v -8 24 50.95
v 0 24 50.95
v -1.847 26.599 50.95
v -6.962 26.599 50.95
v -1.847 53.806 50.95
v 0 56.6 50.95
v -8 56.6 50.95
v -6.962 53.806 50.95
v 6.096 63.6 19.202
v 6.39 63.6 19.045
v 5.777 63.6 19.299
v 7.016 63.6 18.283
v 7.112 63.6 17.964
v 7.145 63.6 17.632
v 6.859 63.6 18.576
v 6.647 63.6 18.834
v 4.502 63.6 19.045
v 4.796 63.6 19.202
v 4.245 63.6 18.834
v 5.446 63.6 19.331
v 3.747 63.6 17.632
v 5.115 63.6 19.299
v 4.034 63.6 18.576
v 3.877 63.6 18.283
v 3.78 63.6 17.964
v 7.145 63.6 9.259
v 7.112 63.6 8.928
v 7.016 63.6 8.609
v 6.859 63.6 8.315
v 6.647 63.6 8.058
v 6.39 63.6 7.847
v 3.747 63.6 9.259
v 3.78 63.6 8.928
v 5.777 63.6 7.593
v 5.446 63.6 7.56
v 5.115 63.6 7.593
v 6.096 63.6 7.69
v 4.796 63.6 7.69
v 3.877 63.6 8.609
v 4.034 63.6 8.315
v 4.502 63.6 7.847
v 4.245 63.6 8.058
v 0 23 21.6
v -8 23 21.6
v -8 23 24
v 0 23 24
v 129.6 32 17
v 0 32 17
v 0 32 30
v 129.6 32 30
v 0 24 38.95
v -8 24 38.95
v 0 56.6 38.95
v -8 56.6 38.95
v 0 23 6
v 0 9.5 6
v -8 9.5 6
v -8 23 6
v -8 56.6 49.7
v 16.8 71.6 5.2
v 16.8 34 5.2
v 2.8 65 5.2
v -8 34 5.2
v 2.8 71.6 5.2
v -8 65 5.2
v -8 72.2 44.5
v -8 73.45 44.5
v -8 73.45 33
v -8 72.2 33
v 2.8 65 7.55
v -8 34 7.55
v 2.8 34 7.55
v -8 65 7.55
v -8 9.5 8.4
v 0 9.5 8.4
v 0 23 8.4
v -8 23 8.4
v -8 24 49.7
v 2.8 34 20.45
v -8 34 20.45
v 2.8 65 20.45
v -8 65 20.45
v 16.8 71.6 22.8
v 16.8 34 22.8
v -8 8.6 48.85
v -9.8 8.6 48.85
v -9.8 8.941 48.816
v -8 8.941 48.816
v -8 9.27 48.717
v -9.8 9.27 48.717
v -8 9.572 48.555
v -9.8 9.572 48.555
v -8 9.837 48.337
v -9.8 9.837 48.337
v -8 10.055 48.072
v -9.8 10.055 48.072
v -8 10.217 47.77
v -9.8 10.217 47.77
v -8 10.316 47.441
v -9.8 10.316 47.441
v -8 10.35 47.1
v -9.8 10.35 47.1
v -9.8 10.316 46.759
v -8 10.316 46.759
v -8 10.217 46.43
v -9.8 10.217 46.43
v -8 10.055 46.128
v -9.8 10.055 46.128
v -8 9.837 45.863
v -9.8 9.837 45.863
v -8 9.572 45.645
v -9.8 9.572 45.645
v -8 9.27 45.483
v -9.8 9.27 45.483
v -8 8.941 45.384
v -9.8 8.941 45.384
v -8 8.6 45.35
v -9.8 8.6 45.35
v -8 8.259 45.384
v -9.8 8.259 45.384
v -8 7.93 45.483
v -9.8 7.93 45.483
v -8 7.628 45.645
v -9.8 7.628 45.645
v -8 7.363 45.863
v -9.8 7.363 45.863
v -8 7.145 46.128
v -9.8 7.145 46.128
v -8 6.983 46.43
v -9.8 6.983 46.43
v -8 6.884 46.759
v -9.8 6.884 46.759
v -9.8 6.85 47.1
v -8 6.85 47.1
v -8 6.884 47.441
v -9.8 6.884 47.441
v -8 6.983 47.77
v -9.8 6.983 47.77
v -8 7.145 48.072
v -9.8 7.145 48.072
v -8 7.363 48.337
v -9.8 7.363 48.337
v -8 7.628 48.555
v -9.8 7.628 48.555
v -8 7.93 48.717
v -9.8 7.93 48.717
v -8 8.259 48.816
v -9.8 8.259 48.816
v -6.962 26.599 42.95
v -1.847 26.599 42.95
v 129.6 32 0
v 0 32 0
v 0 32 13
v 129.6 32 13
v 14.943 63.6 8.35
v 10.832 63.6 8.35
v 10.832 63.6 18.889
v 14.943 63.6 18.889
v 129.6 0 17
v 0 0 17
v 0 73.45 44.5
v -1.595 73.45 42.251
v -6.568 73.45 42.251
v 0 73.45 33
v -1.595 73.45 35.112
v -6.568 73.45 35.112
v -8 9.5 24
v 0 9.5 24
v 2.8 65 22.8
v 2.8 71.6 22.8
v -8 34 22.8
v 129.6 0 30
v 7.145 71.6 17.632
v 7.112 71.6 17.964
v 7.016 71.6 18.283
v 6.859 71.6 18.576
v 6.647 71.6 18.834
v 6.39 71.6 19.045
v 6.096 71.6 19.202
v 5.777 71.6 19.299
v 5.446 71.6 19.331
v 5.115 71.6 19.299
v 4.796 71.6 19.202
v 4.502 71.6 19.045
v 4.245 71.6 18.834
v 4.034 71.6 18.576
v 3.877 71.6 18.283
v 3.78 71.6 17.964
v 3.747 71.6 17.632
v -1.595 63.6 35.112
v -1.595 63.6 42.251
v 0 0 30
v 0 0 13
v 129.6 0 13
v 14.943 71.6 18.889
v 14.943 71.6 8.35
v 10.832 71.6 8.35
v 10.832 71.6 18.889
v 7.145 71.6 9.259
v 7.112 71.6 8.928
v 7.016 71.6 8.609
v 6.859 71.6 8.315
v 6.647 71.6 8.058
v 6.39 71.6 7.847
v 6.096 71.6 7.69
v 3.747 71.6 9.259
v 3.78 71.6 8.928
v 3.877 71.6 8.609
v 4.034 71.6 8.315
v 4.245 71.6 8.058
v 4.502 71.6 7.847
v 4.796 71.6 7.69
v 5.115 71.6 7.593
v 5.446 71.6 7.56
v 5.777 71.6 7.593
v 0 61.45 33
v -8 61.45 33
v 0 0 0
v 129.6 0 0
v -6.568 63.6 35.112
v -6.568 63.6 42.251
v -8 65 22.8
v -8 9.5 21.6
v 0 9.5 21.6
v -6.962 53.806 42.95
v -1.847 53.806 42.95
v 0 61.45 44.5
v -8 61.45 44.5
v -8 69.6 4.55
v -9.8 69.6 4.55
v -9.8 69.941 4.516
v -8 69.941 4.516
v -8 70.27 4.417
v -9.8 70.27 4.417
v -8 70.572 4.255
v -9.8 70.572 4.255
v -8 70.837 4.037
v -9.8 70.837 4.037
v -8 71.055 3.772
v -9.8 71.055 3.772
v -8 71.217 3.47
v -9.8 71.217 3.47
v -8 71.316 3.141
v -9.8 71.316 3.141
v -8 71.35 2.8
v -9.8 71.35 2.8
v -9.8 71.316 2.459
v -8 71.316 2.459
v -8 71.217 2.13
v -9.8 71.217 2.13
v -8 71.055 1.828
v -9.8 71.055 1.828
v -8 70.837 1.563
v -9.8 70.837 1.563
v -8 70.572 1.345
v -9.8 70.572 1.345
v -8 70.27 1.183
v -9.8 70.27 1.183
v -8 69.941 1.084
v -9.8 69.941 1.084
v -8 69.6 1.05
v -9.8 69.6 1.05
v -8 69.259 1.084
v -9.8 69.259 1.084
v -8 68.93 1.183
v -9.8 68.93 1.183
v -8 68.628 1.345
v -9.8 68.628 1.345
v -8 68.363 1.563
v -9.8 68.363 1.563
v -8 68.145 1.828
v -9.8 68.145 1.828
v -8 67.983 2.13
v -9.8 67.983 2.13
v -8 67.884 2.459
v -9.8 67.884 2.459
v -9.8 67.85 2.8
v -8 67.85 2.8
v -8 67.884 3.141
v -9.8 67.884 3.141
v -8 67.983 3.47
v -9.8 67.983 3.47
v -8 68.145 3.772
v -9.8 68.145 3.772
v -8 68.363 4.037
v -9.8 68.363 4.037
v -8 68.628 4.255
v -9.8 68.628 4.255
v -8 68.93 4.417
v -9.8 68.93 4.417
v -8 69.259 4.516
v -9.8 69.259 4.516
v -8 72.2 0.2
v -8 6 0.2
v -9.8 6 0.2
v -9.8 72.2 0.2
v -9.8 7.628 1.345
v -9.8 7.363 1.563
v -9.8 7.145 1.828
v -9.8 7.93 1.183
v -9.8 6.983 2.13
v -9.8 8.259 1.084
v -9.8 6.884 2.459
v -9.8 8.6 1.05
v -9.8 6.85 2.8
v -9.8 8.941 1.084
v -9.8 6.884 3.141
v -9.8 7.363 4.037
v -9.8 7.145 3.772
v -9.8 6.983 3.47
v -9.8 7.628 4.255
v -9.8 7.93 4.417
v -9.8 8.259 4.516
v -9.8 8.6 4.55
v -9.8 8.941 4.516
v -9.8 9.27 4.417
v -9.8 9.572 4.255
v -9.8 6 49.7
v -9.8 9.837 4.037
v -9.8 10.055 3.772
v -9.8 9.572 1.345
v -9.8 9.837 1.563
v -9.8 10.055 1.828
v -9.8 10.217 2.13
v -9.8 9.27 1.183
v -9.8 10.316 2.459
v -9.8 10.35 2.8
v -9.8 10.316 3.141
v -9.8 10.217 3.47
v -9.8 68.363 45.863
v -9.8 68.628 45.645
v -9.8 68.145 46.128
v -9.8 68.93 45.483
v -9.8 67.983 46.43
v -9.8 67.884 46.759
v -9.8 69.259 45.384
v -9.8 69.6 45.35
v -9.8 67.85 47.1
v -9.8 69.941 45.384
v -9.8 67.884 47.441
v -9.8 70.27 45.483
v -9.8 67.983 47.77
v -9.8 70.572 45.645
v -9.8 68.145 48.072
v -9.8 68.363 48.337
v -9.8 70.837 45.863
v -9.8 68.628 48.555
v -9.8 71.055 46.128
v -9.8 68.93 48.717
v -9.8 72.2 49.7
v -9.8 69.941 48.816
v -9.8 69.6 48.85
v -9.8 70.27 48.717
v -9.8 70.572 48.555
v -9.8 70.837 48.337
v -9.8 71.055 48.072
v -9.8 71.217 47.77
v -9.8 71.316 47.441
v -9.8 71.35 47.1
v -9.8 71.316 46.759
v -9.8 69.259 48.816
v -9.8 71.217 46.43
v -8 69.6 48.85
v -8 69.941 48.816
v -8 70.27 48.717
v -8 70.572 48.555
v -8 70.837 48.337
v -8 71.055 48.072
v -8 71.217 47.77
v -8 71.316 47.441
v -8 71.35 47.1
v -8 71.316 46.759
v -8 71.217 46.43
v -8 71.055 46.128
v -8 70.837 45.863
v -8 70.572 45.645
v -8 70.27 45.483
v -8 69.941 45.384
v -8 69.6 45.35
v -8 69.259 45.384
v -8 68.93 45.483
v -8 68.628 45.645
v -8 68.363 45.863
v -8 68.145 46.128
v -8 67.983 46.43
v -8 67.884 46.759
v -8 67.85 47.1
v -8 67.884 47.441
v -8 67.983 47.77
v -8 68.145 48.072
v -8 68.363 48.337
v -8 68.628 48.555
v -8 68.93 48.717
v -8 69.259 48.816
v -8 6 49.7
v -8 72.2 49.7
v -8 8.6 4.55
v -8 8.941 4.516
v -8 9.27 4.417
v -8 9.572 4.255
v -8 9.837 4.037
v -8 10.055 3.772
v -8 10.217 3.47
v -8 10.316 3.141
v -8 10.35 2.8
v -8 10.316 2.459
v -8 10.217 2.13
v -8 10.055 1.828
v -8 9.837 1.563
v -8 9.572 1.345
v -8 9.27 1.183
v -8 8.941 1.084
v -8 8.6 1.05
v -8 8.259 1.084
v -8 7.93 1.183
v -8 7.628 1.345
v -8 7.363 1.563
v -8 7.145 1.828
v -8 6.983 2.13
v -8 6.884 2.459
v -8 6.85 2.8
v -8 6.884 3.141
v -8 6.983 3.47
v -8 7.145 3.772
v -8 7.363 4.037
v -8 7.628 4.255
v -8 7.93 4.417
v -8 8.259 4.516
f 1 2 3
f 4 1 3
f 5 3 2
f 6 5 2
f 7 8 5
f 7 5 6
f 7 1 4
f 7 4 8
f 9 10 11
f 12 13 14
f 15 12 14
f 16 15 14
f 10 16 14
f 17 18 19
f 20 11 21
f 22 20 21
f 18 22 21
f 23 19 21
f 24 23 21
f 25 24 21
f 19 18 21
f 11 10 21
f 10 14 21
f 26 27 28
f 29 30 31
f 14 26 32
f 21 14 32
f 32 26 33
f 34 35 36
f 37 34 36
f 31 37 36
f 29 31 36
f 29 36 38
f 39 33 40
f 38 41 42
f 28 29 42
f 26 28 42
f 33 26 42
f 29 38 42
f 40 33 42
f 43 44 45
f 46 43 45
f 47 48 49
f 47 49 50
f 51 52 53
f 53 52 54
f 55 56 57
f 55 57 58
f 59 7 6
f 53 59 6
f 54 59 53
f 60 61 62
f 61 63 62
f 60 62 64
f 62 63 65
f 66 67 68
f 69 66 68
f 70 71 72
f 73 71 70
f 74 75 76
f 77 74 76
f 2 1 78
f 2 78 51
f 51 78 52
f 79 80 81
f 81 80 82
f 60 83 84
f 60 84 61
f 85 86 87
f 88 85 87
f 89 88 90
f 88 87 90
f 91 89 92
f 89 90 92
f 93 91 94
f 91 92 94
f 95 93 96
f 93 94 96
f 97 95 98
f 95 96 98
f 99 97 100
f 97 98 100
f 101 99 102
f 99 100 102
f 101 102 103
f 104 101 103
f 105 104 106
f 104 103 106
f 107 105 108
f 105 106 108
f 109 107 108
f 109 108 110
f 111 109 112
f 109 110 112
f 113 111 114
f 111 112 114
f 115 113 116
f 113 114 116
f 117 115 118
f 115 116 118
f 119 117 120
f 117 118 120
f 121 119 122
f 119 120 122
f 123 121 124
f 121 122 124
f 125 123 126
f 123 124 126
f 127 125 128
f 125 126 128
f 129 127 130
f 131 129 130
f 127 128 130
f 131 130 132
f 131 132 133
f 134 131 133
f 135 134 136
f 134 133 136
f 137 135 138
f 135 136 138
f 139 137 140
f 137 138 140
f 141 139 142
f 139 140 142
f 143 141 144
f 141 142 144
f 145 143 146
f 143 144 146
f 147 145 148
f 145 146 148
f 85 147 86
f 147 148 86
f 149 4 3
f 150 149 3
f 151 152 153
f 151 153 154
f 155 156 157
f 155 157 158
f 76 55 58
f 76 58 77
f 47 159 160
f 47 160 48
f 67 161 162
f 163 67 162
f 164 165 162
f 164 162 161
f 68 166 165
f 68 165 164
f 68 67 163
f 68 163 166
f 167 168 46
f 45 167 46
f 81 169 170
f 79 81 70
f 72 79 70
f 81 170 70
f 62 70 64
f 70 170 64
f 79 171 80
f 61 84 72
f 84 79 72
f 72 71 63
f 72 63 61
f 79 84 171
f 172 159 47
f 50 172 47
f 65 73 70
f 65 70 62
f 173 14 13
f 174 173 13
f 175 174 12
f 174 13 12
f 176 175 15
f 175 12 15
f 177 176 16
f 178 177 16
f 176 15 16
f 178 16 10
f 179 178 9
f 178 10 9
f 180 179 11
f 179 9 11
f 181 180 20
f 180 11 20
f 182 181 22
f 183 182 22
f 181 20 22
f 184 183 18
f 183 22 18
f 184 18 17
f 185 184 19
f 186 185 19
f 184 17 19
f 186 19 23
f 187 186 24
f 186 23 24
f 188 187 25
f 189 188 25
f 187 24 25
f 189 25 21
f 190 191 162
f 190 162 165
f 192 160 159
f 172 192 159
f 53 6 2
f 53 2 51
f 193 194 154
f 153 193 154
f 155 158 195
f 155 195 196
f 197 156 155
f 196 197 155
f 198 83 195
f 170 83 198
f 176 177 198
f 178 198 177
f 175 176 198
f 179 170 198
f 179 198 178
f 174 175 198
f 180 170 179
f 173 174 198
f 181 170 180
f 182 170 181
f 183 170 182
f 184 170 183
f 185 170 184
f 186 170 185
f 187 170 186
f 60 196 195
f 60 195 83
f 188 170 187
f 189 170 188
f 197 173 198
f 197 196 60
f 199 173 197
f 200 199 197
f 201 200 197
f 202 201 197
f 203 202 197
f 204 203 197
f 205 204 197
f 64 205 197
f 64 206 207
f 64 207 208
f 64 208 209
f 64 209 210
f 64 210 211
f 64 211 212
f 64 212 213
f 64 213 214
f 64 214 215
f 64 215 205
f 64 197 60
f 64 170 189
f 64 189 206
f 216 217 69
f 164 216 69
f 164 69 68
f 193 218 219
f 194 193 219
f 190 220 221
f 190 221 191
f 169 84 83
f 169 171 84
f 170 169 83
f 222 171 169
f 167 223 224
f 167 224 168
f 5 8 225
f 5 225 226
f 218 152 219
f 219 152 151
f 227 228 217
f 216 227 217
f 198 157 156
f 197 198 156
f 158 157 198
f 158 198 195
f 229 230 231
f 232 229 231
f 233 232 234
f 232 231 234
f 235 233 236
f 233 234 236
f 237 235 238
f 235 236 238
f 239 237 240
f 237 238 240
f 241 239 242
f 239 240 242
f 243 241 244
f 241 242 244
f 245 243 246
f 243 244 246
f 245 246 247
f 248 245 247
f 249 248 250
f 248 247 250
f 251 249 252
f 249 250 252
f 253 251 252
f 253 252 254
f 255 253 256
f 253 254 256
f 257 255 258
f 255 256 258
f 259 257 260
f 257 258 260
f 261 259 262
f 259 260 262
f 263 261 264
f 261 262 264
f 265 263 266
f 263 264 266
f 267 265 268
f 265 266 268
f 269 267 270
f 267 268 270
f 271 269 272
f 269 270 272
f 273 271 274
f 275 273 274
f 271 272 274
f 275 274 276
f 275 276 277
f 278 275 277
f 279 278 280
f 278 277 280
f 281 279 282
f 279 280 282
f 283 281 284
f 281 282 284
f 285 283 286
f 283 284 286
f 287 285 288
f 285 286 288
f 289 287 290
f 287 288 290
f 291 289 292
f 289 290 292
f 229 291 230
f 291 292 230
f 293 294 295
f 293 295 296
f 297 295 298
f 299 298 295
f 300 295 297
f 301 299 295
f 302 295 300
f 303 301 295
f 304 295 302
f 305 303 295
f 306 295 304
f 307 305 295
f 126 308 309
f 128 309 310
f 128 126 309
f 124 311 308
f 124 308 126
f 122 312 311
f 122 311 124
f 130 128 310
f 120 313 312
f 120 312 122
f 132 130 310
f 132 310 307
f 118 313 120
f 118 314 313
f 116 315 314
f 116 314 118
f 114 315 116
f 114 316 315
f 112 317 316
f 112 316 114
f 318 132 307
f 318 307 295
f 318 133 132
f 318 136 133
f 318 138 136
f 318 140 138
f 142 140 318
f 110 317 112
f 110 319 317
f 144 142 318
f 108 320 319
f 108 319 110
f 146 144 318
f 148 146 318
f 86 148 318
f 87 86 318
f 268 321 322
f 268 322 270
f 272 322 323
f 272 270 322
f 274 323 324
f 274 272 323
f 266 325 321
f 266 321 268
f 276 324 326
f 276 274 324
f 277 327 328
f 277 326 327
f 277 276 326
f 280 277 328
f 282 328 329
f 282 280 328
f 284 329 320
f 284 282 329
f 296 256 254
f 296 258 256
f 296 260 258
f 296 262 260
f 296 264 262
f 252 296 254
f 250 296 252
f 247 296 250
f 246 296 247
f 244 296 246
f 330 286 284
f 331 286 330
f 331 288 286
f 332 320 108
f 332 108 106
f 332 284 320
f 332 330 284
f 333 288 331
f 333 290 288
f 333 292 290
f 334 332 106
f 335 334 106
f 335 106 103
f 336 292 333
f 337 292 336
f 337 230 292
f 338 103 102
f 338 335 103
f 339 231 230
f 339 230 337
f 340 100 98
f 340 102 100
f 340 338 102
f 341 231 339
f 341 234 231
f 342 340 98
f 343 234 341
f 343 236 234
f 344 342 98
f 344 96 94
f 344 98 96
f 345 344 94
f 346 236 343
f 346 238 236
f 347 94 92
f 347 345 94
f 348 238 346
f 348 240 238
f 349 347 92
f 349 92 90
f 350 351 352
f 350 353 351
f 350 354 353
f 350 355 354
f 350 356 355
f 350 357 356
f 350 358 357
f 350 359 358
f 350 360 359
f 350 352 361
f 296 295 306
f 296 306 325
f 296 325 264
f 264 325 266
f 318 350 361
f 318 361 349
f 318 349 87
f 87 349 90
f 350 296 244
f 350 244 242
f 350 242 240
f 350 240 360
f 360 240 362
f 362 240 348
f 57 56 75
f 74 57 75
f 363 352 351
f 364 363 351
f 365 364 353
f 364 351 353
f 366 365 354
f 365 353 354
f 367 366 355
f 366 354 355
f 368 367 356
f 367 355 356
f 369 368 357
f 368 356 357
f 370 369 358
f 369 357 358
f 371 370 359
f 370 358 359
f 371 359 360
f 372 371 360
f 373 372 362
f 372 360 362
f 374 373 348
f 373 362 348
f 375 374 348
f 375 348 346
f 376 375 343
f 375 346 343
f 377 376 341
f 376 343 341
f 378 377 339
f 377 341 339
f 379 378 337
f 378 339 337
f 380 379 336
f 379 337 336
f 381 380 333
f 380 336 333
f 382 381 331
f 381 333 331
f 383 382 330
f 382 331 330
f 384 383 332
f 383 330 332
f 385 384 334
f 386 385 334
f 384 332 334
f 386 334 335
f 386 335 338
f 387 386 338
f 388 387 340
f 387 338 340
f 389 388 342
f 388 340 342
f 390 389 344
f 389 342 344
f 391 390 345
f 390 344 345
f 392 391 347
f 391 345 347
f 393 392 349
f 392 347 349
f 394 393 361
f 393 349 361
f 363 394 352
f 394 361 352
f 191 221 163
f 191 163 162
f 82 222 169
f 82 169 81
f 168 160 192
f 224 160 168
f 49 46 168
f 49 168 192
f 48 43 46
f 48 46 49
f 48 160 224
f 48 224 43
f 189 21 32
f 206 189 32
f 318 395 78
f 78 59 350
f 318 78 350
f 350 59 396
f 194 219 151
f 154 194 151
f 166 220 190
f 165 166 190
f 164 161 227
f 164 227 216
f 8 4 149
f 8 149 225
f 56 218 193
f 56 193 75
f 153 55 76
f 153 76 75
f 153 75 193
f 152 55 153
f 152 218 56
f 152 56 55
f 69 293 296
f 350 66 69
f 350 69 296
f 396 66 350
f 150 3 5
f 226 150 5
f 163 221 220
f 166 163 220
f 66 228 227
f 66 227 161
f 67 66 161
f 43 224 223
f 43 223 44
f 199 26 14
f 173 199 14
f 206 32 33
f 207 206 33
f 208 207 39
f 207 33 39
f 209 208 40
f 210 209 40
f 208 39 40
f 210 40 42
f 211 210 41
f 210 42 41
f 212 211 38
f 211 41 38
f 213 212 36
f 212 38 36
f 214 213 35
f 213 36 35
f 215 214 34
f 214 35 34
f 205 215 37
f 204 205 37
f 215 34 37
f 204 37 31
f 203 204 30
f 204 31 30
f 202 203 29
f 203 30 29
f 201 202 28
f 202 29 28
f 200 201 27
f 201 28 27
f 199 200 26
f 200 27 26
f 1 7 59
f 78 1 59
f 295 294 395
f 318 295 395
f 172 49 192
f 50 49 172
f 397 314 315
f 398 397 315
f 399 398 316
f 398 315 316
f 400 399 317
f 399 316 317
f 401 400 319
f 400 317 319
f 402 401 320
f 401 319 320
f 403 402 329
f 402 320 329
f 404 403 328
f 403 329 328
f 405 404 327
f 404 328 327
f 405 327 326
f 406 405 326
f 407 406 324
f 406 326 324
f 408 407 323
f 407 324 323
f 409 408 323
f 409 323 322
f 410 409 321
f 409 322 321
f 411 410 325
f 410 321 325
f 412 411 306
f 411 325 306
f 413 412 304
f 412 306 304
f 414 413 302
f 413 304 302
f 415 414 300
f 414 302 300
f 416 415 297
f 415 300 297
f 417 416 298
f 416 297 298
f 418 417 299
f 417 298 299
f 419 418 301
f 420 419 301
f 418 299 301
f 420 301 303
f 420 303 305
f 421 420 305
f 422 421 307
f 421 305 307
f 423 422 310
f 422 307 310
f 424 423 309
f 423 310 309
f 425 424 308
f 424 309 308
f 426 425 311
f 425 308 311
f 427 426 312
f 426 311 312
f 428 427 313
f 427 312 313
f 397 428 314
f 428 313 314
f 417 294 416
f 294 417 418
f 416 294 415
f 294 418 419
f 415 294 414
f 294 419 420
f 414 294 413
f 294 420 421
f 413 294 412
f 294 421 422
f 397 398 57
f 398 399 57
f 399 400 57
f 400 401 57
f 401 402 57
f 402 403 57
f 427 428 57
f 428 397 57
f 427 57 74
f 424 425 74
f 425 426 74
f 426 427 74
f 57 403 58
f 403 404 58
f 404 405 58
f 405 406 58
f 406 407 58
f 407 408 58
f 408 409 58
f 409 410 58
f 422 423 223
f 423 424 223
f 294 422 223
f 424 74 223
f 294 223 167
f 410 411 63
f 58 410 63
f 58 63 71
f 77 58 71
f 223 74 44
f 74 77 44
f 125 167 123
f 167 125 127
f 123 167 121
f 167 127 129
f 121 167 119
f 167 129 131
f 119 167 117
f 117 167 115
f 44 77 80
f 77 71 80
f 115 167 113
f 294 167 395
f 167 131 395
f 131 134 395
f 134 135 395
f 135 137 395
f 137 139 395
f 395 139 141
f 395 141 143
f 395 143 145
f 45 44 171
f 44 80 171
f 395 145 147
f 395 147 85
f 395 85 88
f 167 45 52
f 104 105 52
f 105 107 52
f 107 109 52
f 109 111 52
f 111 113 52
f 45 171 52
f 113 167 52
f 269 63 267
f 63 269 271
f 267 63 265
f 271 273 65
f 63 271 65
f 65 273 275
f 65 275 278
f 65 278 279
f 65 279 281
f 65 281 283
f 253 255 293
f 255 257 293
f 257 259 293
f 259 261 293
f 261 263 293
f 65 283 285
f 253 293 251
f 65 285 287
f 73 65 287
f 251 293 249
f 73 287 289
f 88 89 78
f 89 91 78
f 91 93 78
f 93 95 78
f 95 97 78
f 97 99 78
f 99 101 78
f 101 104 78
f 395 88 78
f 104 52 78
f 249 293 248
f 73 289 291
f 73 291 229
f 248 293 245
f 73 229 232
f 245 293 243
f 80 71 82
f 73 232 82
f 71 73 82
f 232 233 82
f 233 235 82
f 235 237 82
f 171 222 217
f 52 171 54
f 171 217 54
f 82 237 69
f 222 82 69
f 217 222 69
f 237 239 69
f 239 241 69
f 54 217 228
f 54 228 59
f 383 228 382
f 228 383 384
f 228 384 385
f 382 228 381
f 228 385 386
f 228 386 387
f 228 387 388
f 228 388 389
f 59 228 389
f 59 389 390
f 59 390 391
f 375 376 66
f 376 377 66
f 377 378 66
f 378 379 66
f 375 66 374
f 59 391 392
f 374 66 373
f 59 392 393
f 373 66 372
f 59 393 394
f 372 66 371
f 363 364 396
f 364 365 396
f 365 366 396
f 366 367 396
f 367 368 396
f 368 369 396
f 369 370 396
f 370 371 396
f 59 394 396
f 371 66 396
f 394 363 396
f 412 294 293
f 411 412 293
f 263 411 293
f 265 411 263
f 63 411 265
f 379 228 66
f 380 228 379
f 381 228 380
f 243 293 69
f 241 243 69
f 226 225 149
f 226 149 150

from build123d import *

# Parameters (mm, degrees)
SKETCH2_W               = 129.6
SKETCH2_H               = 32
BOSS_EXTRUDE1_DEPTH     = 30
SKETCH3_W               = 2.4
SKETCH3_H               = 13.5
BOSS_EXTRUDE2_DEPTH     = 8
SKETCH4_W               = 49.5
SKETCH4_H               = 66.2
BOSS_EXTRUDE3_DEPTH     = 1.8
SKETCH5_R               = 1.75
CUT_EXTRUDE1_DEPTH      = 1.8
SKETCH6_W               = 2.35
SKETCH6_H               = 31
BOSS_EXTRUDE4_DEPTH     = 10.8
SKETCH7_W               = 17.6
SKETCH7_H               = 37.6
BOSS_EXTRUDE5_DEPTH     = 14
SKETCH8_W               = 11.5
SKETCH8_H               = 12
SKETCH8_W_2             = 12
SKETCH8_H_2             = 32.6
BOSS_EXTRUDE6_DEPTH     = 8
CUT_EXTRUDE2_DEPTH      = 8
CUT_EXTRUDE2_DEPTH_BACK = 8
SKETCH9_W               = 4.972856148
SKETCH9_H               = 7.139248924
SKETCH9_W_2             = 4.11169422
SKETCH9_H_2             = 10.539835888
SKETCH10_W              = 5.114878679
SKETCH10_H              = 27.206324026
CUT_EXTRUDE3_DEPTH      = 8
CUT_EXTRUDE4_DEPTH      = 166.599411231
CUT_EXTRUDE4_DEPTH_BACK = 129.6
SKETCH11_W              = 4
SKETCH11_H              = 32


with BuildPart() as part:
    # Sketch2 → Boss-Extrude1 (new body)
    with BuildSketch(Plane.XY):
        with Locations((64.8, 16)):
            Rectangle(SKETCH2_W, SKETCH2_H)
    extrude(amount=BOSS_EXTRUDE1_DEPTH)

    # Sketch3 → Boss-Extrude2 (add)
    with BuildSketch(Plane.ZY):
        with Locations((7.2, 16.25)):
            Rectangle(SKETCH3_W, SKETCH3_H)
        with Locations((22.8, 16.25)):
            Rectangle(SKETCH3_W, SKETCH3_H)
    extrude(amount=BOSS_EXTRUDE2_DEPTH)

    # Sketch4 → Boss-Extrude3 (add)
    with BuildSketch(Plane.ZY.offset(8)):
        with Locations((24.95, 39.1)):
            Rectangle(SKETCH4_W, SKETCH4_H)
    extrude(amount=BOSS_EXTRUDE3_DEPTH)

    # Sketch5 → Cut-Extrude1 (cut)
    with BuildSketch(Plane.ZY.offset(9.8)):
        with Locations((2.8, 69.6)):
            Circle(SKETCH5_R)
        with Locations((47.1, 69.6)):
            Circle(SKETCH5_R)
        with Locations((47.1, 8.6)):
            Circle(SKETCH5_R)
        with Locations((2.8, 8.6)):
            Circle(SKETCH5_R)
    extrude(amount=-CUT_EXTRUDE1_DEPTH, mode=Mode.SUBTRACT)

    # Sketch6 → Boss-Extrude4 (add)
    with BuildSketch(Plane(origin=(-8, 0, 0), x_dir=(0, 0, -1), z_dir=(1, 0, 0))):
        with Locations((-6.375, 49.5)):
            Rectangle(SKETCH6_W, SKETCH6_H)
        with Locations((-21.625, 49.5)):
            Rectangle(SKETCH6_W, SKETCH6_H)
    extrude(amount=BOSS_EXTRUDE4_DEPTH)

    # Sketch7 → Boss-Extrude5 (add)
    with BuildSketch(Plane(origin=(2.8, 0, 0), x_dir=(0, 0, -1), z_dir=(1, 0, 0))):
        with Locations((-14, 52.8)):
            Rectangle(SKETCH7_W, SKETCH7_H)
    extrude(amount=BOSS_EXTRUDE5_DEPTH)

    # Sketch8 → Boss-Extrude6 (add)
    with BuildSketch(Plane(origin=(-8, 0, 0), x_dir=(0, 0, -1), z_dir=(1, 0, 0))):
        with Locations((-38.75, 67.45)):
            Rectangle(SKETCH8_W, SKETCH8_H)
        with Locations((-44.95, 40.3)):
            Rectangle(SKETCH8_W_2, SKETCH8_H_2)
    extrude(amount=BOSS_EXTRUDE6_DEPTH)

    # Sketch9 → Cut-Extrude2 (cut, two sides: drawn at the far end of the back side and taken through both)
    with BuildSketch(Plane(origin=(0, 71.6, 0), x_dir=(1, 0, 0), z_dir=(0, 1, 0)).offset(-CUT_EXTRUDE2_DEPTH_BACK)):
        with Locations((-4.081901009, -38.681765119)):
            Rectangle(SKETCH9_W, SKETCH9_H)
        with BuildLine():
            Line((7.144873984, -9.259110814), (7.144873984, -17.632407274))
            ThreePointArc((7.144873984, -17.632407274), (5.446047642, -19.331233616), (3.747221299, -17.632407274))
            Line((3.747221299, -17.632407274), (3.747221299, -9.259110814))
            ThreePointArc((3.747221299, -9.259110814), (5.446047642, -7.560284471), (7.144873984, -9.259110814))
        make_face()
        with Locations((12.887635068, -13.619492602)):
            Rectangle(SKETCH9_W_2, SKETCH9_H_2)
    extrude(amount=CUT_EXTRUDE2_DEPTH + CUT_EXTRUDE2_DEPTH_BACK, mode=Mode.SUBTRACT)

    # Sketch10 → Cut-Extrude3 (cut)
    with BuildSketch(Plane.XY.offset(50.95)):
        with Locations((-4.404776722, 40.202538217)):
            Rectangle(SKETCH10_W, SKETCH10_H)
    extrude(amount=-CUT_EXTRUDE3_DEPTH, mode=Mode.SUBTRACT)

    # Sketch11 → Cut-Extrude4 (cut, two sides: drawn at the far end of the back side and taken through both)
    with BuildSketch(Plane(origin=(129.6, 0, 0), x_dir=(0, 0, -1), z_dir=(1, 0, 0)).offset(-CUT_EXTRUDE4_DEPTH_BACK)):
        with Locations((-15, 16)):
            Rectangle(SKETCH11_W, SKETCH11_H)
    extrude(amount=CUT_EXTRUDE4_DEPTH + CUT_EXTRUDE4_DEPTH_BACK, mode=Mode.SUBTRACT)


solid = part.part
